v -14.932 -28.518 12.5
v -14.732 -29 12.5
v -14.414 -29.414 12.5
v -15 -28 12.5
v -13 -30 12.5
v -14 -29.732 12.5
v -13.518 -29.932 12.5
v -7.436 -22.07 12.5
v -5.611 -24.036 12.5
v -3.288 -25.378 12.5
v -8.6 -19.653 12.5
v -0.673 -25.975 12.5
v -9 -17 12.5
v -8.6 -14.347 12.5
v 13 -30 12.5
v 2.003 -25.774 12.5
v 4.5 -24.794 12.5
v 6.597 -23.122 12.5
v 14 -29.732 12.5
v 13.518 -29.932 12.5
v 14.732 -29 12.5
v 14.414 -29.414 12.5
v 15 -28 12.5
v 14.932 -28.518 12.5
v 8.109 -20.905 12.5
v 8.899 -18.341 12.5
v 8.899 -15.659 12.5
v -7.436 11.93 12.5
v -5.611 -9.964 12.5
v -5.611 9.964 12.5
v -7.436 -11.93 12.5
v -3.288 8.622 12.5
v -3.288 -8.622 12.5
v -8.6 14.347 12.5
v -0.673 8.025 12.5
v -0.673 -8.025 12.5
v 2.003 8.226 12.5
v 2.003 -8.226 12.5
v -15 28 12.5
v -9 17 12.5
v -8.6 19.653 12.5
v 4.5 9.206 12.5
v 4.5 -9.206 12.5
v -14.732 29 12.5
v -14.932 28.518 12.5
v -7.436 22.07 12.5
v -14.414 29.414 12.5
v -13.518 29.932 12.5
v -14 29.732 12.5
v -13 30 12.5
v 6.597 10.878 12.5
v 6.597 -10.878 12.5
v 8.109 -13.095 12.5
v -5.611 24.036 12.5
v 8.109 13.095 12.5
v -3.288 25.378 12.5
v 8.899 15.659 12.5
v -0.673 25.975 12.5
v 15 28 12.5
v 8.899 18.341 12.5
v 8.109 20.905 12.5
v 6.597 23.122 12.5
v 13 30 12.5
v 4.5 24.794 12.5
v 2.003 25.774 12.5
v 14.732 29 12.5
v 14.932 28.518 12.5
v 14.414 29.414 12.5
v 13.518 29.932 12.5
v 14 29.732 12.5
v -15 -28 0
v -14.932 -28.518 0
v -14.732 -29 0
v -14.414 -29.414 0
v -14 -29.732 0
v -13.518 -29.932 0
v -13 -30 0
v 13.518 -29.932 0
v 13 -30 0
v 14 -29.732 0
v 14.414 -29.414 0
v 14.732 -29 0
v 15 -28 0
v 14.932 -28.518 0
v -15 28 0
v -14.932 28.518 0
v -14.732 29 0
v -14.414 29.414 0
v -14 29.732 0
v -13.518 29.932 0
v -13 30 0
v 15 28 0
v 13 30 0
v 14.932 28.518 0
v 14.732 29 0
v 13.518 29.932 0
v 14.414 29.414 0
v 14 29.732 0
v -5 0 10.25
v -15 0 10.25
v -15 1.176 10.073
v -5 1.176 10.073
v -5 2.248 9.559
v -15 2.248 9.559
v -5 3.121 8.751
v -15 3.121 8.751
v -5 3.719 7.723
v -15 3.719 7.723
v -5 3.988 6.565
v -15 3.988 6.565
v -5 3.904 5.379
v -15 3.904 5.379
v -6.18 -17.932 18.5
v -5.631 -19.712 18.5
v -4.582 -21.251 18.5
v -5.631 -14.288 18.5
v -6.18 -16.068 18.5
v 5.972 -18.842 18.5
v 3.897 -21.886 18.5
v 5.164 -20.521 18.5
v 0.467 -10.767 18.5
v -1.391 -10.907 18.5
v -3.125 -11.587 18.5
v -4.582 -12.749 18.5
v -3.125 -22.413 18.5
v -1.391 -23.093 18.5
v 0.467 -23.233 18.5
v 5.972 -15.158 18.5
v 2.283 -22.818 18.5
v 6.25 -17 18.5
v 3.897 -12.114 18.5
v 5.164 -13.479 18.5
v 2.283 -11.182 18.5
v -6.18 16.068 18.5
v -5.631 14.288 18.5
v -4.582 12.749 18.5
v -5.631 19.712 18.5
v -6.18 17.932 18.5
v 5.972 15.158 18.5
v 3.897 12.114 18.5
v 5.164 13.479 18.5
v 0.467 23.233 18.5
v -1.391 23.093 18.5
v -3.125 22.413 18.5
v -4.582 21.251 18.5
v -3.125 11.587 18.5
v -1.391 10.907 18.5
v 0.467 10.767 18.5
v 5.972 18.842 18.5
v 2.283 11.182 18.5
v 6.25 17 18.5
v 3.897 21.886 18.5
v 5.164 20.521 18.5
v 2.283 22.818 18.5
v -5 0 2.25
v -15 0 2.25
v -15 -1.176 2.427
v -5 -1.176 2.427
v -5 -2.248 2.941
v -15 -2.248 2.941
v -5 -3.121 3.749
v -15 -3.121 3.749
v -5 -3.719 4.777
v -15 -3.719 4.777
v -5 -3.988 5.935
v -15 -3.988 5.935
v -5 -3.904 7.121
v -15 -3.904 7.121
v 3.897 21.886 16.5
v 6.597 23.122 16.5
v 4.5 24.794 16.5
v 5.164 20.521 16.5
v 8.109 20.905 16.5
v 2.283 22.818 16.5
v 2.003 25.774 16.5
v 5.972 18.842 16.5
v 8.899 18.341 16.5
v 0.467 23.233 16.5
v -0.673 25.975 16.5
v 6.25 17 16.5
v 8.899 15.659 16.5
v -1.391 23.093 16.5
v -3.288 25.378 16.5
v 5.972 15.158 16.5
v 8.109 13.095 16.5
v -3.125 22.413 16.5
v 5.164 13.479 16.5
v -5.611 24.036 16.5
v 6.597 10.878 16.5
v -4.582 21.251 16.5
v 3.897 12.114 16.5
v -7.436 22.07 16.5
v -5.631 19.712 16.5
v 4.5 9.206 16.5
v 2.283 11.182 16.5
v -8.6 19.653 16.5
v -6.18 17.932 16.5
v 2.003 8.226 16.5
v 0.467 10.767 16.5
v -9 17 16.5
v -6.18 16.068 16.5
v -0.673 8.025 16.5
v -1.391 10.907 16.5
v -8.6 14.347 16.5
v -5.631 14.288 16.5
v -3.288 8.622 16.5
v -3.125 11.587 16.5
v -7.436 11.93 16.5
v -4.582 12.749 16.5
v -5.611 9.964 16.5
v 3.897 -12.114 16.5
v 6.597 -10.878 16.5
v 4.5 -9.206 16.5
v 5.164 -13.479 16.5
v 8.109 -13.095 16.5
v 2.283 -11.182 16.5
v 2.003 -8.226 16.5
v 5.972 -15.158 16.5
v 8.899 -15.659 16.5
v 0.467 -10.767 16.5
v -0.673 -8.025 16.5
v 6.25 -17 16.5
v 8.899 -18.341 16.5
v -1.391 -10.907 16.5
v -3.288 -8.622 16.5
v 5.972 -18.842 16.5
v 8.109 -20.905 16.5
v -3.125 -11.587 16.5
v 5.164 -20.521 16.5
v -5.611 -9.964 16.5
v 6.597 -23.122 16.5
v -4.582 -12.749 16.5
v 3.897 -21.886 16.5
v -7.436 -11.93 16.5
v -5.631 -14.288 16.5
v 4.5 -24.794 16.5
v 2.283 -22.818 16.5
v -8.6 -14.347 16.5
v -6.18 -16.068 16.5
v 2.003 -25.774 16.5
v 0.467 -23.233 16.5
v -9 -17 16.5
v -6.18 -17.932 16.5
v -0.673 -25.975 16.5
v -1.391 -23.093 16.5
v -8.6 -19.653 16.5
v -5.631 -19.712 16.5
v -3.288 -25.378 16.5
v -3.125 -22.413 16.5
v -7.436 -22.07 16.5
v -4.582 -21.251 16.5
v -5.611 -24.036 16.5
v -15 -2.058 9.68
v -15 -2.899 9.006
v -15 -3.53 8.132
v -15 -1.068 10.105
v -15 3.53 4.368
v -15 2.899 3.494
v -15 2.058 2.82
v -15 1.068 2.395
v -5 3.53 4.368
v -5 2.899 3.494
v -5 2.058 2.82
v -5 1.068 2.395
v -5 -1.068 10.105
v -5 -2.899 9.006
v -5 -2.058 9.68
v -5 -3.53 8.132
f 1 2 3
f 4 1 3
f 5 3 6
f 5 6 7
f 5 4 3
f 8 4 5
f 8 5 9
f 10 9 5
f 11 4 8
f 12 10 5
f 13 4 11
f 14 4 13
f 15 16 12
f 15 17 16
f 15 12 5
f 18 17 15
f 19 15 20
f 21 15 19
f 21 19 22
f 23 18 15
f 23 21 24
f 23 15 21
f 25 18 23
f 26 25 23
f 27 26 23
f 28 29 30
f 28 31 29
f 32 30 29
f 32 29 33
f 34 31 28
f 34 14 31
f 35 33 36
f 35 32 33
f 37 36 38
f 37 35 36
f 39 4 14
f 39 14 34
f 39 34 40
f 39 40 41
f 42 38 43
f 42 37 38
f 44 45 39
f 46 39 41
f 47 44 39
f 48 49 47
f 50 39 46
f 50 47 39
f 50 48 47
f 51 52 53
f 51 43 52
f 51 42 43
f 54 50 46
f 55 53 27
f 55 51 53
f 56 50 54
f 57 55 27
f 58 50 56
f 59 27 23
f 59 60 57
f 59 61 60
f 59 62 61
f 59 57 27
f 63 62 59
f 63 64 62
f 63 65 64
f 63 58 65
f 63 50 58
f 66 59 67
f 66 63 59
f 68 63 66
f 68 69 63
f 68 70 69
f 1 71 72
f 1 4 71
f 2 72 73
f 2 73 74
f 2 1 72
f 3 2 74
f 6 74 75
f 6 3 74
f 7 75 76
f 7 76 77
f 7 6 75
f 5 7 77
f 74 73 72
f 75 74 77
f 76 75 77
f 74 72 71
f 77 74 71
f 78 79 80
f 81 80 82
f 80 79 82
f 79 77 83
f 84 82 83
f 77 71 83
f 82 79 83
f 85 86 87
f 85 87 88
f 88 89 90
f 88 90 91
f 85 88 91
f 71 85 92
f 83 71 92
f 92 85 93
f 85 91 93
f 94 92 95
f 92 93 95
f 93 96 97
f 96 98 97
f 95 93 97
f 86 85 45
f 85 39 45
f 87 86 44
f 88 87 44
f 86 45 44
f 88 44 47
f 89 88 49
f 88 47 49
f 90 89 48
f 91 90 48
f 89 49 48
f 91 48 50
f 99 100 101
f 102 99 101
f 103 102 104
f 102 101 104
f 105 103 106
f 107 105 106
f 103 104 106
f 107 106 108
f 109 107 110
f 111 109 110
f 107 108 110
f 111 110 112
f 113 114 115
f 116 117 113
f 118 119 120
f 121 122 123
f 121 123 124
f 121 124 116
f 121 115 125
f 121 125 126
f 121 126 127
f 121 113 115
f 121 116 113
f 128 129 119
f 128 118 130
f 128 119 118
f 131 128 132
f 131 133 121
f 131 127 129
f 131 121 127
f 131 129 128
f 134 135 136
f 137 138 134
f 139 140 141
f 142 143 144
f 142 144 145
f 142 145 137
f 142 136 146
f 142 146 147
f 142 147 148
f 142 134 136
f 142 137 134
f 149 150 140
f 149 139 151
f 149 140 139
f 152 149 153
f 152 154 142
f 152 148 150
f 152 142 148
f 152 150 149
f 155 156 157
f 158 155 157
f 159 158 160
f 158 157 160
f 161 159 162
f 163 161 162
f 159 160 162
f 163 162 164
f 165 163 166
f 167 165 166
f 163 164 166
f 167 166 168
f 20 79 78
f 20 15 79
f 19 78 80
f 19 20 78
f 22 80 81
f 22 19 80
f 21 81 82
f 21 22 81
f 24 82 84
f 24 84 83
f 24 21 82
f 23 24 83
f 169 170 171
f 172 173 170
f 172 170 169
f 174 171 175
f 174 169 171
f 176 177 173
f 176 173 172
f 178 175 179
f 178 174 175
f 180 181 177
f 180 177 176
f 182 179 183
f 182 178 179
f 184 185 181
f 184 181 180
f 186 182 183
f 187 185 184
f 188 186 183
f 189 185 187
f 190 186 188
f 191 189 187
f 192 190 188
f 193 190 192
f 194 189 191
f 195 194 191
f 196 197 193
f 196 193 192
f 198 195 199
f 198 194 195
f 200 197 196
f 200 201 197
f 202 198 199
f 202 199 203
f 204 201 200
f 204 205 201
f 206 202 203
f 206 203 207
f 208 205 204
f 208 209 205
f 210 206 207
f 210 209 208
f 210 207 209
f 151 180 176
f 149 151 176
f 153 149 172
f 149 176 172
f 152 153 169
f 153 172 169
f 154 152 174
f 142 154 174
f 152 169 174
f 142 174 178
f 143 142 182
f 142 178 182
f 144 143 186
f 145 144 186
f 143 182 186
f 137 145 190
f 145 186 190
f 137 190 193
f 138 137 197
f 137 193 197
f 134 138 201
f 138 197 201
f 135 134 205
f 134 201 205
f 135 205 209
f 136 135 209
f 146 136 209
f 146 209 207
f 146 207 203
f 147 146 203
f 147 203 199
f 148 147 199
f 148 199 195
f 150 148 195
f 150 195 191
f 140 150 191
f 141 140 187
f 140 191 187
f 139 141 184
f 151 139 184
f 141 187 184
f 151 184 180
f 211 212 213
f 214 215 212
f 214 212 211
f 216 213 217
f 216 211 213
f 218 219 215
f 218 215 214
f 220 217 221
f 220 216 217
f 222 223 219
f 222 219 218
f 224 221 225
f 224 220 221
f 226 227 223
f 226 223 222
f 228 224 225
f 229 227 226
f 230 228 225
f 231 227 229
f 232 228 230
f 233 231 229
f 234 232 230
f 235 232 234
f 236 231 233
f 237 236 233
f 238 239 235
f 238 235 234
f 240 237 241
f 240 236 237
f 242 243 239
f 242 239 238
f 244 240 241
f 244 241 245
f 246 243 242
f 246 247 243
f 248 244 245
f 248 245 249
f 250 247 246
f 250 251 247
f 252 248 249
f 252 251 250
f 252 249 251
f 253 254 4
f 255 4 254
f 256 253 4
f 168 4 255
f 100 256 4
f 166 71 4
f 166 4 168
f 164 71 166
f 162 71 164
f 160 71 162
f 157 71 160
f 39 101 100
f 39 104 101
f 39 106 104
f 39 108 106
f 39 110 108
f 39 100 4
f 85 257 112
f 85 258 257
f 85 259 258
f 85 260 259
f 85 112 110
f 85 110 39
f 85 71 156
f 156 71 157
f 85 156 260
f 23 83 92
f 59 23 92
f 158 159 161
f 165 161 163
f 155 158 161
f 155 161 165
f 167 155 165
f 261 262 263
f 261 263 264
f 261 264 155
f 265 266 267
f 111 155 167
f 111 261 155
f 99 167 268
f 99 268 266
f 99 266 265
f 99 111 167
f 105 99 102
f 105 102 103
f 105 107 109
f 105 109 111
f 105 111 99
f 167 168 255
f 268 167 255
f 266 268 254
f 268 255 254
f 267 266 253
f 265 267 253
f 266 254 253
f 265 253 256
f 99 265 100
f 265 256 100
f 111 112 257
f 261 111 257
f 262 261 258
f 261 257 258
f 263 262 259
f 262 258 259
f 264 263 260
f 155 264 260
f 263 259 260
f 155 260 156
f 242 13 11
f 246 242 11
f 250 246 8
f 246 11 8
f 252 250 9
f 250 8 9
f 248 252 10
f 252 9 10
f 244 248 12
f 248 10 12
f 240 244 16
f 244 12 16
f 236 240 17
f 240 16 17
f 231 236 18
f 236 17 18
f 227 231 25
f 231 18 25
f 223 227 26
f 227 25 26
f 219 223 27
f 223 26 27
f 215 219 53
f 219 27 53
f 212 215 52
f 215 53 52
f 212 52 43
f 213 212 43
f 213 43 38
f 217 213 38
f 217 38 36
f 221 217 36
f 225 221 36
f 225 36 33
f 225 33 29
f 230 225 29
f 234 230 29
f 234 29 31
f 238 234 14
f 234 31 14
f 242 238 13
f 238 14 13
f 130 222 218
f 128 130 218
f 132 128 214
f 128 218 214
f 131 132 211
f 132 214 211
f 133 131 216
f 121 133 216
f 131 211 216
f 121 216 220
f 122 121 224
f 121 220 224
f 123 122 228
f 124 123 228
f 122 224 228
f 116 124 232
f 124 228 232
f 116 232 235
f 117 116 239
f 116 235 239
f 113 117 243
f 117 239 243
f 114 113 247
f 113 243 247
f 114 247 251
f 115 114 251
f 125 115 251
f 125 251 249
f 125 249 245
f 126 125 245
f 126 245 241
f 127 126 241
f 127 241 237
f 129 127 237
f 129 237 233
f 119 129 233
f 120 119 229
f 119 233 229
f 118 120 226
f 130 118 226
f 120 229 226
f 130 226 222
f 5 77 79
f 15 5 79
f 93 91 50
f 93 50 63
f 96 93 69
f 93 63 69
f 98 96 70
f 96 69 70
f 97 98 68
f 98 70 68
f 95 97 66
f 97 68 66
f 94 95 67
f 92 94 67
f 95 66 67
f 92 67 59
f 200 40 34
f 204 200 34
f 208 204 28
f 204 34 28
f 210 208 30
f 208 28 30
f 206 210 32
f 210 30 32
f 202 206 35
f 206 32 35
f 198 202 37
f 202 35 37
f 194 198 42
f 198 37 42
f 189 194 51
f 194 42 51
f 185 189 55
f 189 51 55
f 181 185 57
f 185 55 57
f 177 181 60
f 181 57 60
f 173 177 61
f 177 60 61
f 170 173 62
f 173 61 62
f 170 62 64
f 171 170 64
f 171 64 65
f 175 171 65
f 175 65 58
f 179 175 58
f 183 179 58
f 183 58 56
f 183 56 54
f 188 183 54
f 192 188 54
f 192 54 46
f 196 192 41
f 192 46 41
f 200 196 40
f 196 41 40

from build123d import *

# Parameters (mm, degrees)
SKETCH_1_W          = 30
SKETCH_1_H          = 60
EXTRUDE_1_DEPTH     = 12.5
SKETCH_2_R          = 9
EXTRUDE_2_DEPTH     = 4
SKETCH_3_R          = 6.25
EXTRUDE_3_DEPTH     = 2
FILLET_1_R          = 2
CUT_EXTRUDE_1_DEPTH = 10


with BuildPart() as part:
    # 草图1 → 凸台-拉伸1 (new body)
    with BuildSketch(Plane.XY):
        Rectangle(SKETCH_1_W, SKETCH_1_H)
    extrude(amount=EXTRUDE_1_DEPTH)

    # 草图2 → 凸台-拉伸2 (add)
    with BuildSketch(Plane.XY.offset(12.5)):
        with Locations(Location((0, 17, 0), (0, 0, 180))):
            Circle(SKETCH_2_R)
        with Locations(Location((0, -17, 0), (0, 0, 180))):
            Circle(SKETCH_2_R)
    extrude(amount=EXTRUDE_2_DEPTH)

    # 草图3 → 凸台-拉伸3 (add)
    with BuildSketch(Plane.XY.offset(16.5)):
        with Locations((0, 17)):
            Circle(SKETCH_3_R)
        with Locations((0, -17)):
            Circle(SKETCH_3_R)
    extrude(amount=EXTRUDE_3_DEPTH)

    # 圆角1
    fillet_1_edges = [part.edges().sort_by_distance(p)[0] for p in [
        (15, -30, 6.25),
        (-15, -30, 6.25),
        (-15, 30, 6.25),
        (15, 30, 6.25),
    ]]
    fillet(fillet_1_edges, radius=FILLET_1_R)

    # 草图4 → 切除-拉伸1 (cut)
    with BuildSketch(Plane.ZY.offset(15)):
        with BuildLine():
            ThreePointArc((10.25, 0), (8.751434736, 3.12134975), (5.37858787, 3.903926344))
            Line((5.37858787, 3.903926344), (6.25, 0))
            Line((6.25, 0), (10.25, 0))
        make_face()
        with BuildLine():
            Line((6.25, 0), (5.37858787, 3.903926344))
            ThreePointArc((5.37858787, 3.903926344), (3.12865025, 2.501434736), (2.25, 0))
            Line((2.25, 0), (6.25, 0))
        make_face()
        with BuildLine():
            Line((10.25, 0), (6.25, 0))
            Line((6.25, 0), (7.12141213, -3.903926344))
            ThreePointArc((7.12141213, -3.903926344), (9.37134975, -2.501434736), (10.25, 0))
        make_face()
        with BuildLine():
            Line((7.12141213, -3.903926344), (6.25, 0))
            Line((6.25, 0), (2.25, 0))
            ThreePointArc((2.25, 0), (3.748565264, -3.12134975), (7.12141213, -3.903926344))
        make_face()
    extrude(amount=-CUT_EXTRUDE_1_DEPTH, mode=Mode.SUBTRACT)


solid = part.part
